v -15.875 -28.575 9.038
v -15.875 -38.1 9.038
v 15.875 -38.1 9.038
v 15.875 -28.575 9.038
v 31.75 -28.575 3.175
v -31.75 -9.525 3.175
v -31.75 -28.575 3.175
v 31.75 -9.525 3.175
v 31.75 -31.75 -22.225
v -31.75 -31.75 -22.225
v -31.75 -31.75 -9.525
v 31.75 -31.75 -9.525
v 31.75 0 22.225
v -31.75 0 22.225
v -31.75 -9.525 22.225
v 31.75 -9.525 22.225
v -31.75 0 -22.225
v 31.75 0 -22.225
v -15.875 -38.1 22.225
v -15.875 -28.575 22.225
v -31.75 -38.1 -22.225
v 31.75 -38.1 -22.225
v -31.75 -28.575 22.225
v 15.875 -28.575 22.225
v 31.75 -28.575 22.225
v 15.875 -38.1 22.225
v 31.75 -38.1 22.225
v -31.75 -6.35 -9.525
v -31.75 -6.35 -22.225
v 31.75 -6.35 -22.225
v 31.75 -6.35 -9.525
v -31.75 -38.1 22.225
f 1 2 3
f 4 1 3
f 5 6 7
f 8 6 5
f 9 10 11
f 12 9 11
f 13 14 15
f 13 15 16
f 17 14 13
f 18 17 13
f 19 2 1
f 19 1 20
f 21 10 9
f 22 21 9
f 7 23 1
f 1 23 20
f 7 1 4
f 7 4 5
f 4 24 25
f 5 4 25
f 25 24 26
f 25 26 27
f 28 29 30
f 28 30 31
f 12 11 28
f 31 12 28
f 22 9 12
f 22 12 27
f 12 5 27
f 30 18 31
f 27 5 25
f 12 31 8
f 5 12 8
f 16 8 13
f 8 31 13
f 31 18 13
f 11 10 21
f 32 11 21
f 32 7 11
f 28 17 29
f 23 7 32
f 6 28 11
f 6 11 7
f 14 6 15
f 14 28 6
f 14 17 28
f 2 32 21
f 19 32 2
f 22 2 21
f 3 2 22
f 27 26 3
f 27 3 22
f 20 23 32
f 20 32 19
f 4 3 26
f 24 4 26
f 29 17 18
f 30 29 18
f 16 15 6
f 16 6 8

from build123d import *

# Parameters (mm, degrees)
F0_W     = 63.5
F0_H     = 44.45
F1_DEPTH = 38.1
F2_W     = 31.75
F2_H     = 13.187168
F3_DEPTH = 9.525
F4_W     = 63.5
F4_H     = 19.05
F5_DEPTH = 19.05
F6_W     = 25.4
F6_H     = 12.7
F7_DEPTH = 63.501


with BuildPart() as f1:
    # F0 (on Front) → F1 (new body)
    with BuildSketch(Plane.XZ):
        Rectangle(F0_W, F0_H)
    extrude(amount=F1_DEPTH)

    # F2 (on face) → F3 (cut)
    with BuildSketch(Plane.XZ.offset(38.1)):
        with Locations((0, 15.631416)):
            Rectangle(F2_W, F2_H)
    extrude(amount=-F3_DEPTH, mode=Mode.SUBTRACT)

    # F4 (on face) → F5 (cut)
    with BuildSketch(Plane.XY.offset(22.225)):
        with Locations((0, -19.05)):
            Rectangle(F4_W, F4_H)
    extrude(amount=-F5_DEPTH, mode=Mode.SUBTRACT)

    # F6 (on face) → F7 (cut, through all)
    with BuildSketch(Plane.YZ.offset(31.75)):
        with Locations((-19.05, -15.875)):
            Rectangle(F6_W, F6_H)
    extrude(amount=-F7_DEPTH, mode=Mode.SUBTRACT)


solid = f1.part
